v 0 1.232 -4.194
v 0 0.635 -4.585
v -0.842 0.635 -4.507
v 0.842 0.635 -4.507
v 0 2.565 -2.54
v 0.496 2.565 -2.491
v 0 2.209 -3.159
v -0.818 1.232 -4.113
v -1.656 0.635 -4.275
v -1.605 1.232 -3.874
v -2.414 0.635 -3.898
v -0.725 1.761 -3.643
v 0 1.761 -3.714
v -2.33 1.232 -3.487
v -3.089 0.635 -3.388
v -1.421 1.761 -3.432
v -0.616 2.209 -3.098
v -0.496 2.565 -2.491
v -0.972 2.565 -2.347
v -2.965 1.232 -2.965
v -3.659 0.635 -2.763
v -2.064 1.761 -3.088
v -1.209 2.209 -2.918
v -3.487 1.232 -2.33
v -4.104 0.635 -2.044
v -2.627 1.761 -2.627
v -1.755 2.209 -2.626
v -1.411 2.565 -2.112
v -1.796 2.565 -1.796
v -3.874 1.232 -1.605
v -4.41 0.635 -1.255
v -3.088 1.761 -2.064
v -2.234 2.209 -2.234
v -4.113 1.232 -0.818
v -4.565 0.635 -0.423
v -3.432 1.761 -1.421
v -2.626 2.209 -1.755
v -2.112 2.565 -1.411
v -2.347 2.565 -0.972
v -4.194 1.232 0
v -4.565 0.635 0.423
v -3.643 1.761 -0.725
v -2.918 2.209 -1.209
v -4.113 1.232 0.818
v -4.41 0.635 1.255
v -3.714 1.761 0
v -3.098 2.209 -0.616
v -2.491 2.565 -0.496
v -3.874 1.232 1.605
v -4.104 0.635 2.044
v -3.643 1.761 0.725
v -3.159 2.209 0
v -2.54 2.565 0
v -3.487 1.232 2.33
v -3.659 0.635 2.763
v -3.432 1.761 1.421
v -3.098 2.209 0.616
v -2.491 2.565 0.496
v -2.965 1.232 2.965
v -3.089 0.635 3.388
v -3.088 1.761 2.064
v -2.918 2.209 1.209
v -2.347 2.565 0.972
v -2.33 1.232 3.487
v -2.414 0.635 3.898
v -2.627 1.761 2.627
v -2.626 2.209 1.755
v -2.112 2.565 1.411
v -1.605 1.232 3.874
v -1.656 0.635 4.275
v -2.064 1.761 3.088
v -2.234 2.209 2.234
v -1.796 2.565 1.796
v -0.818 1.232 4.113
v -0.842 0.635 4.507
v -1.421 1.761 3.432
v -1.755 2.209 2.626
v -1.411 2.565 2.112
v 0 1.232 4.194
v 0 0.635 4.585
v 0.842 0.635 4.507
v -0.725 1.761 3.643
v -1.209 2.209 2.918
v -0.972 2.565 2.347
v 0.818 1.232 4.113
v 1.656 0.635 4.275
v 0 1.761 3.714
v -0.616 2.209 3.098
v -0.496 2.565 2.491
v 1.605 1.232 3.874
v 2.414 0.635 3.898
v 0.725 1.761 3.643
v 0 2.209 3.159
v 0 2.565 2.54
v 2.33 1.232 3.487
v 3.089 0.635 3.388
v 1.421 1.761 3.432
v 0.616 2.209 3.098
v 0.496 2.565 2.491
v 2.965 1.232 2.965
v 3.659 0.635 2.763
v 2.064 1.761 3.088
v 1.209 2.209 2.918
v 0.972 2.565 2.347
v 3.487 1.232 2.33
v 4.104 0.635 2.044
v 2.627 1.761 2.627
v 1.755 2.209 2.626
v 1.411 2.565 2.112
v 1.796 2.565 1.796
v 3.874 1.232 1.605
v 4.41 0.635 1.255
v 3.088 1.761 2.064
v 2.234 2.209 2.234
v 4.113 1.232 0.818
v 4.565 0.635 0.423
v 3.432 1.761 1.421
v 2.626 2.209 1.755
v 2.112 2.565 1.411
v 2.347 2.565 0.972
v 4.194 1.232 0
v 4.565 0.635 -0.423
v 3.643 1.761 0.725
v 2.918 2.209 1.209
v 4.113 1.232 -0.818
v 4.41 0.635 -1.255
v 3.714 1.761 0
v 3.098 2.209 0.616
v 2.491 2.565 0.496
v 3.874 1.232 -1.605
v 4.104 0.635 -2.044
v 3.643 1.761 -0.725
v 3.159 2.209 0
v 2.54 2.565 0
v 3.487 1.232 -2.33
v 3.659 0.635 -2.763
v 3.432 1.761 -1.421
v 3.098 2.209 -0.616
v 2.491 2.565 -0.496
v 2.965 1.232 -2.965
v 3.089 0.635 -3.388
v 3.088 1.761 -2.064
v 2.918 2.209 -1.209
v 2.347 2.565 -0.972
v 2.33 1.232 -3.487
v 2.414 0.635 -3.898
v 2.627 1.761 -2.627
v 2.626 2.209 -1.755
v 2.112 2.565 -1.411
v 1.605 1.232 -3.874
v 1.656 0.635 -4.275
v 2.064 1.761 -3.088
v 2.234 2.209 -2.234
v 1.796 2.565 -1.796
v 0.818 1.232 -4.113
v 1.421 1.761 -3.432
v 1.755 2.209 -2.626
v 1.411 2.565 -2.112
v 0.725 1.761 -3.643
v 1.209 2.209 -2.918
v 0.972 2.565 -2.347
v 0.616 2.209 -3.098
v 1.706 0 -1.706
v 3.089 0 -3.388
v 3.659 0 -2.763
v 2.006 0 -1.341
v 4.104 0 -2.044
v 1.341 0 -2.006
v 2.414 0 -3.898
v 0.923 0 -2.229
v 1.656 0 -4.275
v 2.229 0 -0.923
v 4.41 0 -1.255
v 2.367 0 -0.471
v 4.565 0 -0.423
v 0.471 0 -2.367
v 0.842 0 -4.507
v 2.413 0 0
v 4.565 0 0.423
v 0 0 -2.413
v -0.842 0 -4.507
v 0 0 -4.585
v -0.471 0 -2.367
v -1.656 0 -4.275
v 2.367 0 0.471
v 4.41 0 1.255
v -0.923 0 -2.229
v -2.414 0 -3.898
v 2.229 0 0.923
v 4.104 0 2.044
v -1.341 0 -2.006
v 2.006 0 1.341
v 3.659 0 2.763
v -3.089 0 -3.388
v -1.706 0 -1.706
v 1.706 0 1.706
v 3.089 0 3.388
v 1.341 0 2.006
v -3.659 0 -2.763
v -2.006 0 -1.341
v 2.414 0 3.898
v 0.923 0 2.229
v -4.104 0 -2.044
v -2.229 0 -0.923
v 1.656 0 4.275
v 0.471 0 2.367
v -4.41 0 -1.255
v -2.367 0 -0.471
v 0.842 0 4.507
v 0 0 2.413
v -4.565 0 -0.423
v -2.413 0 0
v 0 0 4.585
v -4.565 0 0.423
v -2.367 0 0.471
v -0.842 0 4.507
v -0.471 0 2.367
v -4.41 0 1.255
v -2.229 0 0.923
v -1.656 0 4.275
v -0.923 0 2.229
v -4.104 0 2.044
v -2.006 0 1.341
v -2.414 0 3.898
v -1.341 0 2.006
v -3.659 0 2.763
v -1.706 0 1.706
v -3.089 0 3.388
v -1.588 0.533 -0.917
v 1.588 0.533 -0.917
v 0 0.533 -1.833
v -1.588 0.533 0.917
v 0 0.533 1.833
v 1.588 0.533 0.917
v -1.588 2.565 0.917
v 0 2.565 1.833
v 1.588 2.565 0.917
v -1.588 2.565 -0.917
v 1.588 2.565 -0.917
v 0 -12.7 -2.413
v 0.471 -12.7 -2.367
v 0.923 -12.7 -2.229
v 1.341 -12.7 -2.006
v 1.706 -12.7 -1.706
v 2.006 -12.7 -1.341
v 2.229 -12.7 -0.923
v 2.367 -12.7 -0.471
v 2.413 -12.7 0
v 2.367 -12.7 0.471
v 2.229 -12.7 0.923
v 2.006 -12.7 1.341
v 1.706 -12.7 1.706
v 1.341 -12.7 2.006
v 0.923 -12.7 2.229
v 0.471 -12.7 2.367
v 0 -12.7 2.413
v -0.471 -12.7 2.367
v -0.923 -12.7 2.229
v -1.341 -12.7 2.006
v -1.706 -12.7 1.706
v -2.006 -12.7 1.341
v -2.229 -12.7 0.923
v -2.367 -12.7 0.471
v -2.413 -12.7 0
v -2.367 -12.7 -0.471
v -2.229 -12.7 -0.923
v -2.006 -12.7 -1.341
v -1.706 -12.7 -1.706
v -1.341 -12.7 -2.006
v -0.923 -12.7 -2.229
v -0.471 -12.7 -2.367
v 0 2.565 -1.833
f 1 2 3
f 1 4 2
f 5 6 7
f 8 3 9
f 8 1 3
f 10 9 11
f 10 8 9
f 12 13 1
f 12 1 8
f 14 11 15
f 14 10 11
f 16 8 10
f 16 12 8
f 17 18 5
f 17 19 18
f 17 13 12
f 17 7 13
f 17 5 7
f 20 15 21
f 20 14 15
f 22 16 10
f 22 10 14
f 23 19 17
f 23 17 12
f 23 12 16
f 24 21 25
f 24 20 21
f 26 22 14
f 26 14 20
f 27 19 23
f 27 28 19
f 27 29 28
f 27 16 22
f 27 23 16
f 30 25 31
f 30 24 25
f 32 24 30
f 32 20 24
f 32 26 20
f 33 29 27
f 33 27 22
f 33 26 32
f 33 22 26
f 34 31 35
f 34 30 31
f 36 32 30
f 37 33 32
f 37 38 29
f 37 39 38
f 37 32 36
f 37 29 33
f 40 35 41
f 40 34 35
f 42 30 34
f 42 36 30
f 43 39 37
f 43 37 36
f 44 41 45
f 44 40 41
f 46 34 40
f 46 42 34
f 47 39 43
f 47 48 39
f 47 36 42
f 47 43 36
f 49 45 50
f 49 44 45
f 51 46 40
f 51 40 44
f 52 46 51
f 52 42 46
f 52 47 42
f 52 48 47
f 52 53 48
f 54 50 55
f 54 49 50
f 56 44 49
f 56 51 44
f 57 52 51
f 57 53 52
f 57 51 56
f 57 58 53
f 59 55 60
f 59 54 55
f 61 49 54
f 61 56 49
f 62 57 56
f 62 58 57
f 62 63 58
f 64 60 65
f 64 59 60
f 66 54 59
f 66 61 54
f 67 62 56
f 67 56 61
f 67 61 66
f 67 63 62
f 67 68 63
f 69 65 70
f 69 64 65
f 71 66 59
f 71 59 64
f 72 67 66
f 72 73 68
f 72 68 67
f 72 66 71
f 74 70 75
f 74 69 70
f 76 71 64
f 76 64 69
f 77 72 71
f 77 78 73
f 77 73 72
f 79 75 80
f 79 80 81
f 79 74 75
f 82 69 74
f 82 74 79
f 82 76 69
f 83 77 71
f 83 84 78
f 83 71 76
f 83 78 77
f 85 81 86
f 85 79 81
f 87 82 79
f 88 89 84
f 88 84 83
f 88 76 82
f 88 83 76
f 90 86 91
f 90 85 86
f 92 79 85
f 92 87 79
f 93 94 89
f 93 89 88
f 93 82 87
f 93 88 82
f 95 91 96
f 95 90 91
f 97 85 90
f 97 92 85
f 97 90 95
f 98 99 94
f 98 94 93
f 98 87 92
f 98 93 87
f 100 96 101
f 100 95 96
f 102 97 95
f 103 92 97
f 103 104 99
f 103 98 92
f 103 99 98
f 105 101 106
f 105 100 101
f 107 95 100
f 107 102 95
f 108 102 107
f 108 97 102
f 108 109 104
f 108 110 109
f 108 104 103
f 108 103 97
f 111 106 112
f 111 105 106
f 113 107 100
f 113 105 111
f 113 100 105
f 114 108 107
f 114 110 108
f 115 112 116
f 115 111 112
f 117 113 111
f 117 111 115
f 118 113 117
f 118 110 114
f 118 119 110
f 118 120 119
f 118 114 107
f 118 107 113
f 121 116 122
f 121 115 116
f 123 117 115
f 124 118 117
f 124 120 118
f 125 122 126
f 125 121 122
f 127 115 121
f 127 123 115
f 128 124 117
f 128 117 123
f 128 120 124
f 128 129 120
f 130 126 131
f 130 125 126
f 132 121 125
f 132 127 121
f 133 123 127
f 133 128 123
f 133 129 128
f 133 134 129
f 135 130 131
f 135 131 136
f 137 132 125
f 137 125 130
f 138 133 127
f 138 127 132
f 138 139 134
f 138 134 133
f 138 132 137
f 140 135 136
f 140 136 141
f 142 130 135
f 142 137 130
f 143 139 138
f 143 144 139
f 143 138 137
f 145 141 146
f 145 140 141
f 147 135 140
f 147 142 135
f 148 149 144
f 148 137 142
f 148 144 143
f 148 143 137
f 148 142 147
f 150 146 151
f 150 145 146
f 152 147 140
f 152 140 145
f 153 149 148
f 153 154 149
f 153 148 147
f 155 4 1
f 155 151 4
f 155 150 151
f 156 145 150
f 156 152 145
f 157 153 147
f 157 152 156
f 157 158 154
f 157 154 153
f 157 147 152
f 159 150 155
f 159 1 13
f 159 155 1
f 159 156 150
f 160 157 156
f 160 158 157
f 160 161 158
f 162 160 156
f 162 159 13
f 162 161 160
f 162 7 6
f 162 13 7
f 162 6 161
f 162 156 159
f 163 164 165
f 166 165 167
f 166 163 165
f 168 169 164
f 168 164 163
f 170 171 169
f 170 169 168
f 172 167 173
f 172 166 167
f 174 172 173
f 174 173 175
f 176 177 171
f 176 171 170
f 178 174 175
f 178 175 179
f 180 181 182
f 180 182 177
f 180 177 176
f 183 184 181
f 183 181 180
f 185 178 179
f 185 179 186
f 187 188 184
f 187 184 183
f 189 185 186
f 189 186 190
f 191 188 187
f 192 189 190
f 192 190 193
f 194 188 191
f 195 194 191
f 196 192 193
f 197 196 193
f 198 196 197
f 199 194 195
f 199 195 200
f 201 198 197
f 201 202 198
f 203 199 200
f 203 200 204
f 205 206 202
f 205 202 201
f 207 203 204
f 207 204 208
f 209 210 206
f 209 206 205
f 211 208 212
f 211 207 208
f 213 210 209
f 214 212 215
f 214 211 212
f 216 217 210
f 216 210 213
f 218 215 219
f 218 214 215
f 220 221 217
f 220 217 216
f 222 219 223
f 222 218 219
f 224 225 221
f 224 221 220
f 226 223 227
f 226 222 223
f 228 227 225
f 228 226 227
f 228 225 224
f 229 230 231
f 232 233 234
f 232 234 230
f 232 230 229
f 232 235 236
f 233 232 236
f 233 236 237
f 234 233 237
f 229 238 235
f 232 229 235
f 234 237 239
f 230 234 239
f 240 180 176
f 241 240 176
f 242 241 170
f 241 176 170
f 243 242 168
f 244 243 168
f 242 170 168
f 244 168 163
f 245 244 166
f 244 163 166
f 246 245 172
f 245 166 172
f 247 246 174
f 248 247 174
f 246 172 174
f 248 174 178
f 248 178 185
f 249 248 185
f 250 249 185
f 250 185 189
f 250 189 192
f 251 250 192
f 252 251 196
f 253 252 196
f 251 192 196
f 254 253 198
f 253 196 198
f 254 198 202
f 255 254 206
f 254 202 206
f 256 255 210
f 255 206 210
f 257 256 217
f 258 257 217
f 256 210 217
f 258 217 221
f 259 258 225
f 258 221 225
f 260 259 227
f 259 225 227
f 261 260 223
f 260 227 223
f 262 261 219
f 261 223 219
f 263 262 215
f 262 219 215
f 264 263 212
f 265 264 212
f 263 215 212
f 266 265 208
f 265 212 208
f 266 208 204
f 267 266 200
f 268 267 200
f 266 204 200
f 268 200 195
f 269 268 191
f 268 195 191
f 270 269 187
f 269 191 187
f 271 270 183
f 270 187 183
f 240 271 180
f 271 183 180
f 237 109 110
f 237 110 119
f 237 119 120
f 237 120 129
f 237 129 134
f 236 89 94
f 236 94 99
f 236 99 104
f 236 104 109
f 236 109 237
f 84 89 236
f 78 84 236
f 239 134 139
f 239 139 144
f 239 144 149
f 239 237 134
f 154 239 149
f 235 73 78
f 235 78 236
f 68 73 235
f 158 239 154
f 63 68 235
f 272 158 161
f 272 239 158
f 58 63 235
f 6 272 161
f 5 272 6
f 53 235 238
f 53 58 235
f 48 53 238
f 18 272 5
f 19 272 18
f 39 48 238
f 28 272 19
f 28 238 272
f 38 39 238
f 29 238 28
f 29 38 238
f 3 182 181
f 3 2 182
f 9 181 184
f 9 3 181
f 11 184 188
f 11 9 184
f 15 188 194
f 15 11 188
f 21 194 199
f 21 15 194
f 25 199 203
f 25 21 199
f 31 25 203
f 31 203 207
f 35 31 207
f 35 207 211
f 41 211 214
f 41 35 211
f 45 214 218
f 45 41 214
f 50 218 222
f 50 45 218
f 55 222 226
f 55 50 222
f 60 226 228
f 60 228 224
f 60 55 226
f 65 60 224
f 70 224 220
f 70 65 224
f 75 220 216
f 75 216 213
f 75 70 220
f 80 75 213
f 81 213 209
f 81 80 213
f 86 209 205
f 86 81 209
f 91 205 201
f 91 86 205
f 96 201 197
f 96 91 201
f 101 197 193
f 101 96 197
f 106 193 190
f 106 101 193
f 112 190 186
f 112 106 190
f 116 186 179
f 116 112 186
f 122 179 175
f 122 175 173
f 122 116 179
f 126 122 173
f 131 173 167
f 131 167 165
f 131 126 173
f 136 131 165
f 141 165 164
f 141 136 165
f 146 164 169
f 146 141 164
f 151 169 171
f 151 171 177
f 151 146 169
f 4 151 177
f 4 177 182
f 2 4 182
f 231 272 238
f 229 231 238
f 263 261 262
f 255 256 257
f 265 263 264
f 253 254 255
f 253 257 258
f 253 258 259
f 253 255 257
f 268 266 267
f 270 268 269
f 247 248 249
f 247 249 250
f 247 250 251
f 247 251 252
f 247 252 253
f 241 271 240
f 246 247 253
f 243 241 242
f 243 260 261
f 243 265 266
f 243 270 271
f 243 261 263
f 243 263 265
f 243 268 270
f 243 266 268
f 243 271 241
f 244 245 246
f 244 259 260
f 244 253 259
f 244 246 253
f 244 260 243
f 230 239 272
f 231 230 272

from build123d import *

# Parameters (mm, degrees)
CUT_EXTRUDE1_DEPTH = 2.032
SKETCH3_R          = 2.413
EXTRUDE1_DEPTH     = 12.7


with BuildPart() as part:
    # Sketch1 → Revolve1 (revolve)
    with BuildSketch(Plane.XY, mode=Mode.PRIVATE) as revolve1_sk:
        with BuildLine():
            Line((4.5847, 0), (4.5847, 0.635))
            ThreePointArc((4.5847, 0.635), (3.714445355, 1.761301001), (2.54, 2.5654))
            Line((2.54, 2.5654), (0, 2.5654))
            Line((0, 2.5654), (0, 0))
            Line((0, 0), (4.5847, 0))
        make_face()
    revolve(revolve1_sk.sketch.rotate(Axis((0, 0, 0), (0, 1, 0)), 90), axis=Axis((0, 0, 0), (0, 1, 0)))

    # Sketch2 → Cut-Extrude1 (cut)
    with BuildSketch(Plane(origin=(0, 2.5654, 0), x_dir=(-1, 0, 0), z_dir=(0, 1, 0))):
        Polygon((0, 1.833087105), (-1.5875, 0.916543552), (-1.5875, -0.916543552), (0, -1.833087105), (1.5875, -0.916543552), (1.5875, 0.916543552), align=None)
    extrude(amount=-CUT_EXTRUDE1_DEPTH, mode=Mode.SUBTRACT)

    # Sketch3 → Extrude1 (add)
    with BuildSketch(Plane.XZ):
        with Locations(Location((0, 0, 0), (0, 0, 270))):
            Circle(SKETCH3_R)
    extrude(amount=EXTRUDE1_DEPTH)


solid = part.part
